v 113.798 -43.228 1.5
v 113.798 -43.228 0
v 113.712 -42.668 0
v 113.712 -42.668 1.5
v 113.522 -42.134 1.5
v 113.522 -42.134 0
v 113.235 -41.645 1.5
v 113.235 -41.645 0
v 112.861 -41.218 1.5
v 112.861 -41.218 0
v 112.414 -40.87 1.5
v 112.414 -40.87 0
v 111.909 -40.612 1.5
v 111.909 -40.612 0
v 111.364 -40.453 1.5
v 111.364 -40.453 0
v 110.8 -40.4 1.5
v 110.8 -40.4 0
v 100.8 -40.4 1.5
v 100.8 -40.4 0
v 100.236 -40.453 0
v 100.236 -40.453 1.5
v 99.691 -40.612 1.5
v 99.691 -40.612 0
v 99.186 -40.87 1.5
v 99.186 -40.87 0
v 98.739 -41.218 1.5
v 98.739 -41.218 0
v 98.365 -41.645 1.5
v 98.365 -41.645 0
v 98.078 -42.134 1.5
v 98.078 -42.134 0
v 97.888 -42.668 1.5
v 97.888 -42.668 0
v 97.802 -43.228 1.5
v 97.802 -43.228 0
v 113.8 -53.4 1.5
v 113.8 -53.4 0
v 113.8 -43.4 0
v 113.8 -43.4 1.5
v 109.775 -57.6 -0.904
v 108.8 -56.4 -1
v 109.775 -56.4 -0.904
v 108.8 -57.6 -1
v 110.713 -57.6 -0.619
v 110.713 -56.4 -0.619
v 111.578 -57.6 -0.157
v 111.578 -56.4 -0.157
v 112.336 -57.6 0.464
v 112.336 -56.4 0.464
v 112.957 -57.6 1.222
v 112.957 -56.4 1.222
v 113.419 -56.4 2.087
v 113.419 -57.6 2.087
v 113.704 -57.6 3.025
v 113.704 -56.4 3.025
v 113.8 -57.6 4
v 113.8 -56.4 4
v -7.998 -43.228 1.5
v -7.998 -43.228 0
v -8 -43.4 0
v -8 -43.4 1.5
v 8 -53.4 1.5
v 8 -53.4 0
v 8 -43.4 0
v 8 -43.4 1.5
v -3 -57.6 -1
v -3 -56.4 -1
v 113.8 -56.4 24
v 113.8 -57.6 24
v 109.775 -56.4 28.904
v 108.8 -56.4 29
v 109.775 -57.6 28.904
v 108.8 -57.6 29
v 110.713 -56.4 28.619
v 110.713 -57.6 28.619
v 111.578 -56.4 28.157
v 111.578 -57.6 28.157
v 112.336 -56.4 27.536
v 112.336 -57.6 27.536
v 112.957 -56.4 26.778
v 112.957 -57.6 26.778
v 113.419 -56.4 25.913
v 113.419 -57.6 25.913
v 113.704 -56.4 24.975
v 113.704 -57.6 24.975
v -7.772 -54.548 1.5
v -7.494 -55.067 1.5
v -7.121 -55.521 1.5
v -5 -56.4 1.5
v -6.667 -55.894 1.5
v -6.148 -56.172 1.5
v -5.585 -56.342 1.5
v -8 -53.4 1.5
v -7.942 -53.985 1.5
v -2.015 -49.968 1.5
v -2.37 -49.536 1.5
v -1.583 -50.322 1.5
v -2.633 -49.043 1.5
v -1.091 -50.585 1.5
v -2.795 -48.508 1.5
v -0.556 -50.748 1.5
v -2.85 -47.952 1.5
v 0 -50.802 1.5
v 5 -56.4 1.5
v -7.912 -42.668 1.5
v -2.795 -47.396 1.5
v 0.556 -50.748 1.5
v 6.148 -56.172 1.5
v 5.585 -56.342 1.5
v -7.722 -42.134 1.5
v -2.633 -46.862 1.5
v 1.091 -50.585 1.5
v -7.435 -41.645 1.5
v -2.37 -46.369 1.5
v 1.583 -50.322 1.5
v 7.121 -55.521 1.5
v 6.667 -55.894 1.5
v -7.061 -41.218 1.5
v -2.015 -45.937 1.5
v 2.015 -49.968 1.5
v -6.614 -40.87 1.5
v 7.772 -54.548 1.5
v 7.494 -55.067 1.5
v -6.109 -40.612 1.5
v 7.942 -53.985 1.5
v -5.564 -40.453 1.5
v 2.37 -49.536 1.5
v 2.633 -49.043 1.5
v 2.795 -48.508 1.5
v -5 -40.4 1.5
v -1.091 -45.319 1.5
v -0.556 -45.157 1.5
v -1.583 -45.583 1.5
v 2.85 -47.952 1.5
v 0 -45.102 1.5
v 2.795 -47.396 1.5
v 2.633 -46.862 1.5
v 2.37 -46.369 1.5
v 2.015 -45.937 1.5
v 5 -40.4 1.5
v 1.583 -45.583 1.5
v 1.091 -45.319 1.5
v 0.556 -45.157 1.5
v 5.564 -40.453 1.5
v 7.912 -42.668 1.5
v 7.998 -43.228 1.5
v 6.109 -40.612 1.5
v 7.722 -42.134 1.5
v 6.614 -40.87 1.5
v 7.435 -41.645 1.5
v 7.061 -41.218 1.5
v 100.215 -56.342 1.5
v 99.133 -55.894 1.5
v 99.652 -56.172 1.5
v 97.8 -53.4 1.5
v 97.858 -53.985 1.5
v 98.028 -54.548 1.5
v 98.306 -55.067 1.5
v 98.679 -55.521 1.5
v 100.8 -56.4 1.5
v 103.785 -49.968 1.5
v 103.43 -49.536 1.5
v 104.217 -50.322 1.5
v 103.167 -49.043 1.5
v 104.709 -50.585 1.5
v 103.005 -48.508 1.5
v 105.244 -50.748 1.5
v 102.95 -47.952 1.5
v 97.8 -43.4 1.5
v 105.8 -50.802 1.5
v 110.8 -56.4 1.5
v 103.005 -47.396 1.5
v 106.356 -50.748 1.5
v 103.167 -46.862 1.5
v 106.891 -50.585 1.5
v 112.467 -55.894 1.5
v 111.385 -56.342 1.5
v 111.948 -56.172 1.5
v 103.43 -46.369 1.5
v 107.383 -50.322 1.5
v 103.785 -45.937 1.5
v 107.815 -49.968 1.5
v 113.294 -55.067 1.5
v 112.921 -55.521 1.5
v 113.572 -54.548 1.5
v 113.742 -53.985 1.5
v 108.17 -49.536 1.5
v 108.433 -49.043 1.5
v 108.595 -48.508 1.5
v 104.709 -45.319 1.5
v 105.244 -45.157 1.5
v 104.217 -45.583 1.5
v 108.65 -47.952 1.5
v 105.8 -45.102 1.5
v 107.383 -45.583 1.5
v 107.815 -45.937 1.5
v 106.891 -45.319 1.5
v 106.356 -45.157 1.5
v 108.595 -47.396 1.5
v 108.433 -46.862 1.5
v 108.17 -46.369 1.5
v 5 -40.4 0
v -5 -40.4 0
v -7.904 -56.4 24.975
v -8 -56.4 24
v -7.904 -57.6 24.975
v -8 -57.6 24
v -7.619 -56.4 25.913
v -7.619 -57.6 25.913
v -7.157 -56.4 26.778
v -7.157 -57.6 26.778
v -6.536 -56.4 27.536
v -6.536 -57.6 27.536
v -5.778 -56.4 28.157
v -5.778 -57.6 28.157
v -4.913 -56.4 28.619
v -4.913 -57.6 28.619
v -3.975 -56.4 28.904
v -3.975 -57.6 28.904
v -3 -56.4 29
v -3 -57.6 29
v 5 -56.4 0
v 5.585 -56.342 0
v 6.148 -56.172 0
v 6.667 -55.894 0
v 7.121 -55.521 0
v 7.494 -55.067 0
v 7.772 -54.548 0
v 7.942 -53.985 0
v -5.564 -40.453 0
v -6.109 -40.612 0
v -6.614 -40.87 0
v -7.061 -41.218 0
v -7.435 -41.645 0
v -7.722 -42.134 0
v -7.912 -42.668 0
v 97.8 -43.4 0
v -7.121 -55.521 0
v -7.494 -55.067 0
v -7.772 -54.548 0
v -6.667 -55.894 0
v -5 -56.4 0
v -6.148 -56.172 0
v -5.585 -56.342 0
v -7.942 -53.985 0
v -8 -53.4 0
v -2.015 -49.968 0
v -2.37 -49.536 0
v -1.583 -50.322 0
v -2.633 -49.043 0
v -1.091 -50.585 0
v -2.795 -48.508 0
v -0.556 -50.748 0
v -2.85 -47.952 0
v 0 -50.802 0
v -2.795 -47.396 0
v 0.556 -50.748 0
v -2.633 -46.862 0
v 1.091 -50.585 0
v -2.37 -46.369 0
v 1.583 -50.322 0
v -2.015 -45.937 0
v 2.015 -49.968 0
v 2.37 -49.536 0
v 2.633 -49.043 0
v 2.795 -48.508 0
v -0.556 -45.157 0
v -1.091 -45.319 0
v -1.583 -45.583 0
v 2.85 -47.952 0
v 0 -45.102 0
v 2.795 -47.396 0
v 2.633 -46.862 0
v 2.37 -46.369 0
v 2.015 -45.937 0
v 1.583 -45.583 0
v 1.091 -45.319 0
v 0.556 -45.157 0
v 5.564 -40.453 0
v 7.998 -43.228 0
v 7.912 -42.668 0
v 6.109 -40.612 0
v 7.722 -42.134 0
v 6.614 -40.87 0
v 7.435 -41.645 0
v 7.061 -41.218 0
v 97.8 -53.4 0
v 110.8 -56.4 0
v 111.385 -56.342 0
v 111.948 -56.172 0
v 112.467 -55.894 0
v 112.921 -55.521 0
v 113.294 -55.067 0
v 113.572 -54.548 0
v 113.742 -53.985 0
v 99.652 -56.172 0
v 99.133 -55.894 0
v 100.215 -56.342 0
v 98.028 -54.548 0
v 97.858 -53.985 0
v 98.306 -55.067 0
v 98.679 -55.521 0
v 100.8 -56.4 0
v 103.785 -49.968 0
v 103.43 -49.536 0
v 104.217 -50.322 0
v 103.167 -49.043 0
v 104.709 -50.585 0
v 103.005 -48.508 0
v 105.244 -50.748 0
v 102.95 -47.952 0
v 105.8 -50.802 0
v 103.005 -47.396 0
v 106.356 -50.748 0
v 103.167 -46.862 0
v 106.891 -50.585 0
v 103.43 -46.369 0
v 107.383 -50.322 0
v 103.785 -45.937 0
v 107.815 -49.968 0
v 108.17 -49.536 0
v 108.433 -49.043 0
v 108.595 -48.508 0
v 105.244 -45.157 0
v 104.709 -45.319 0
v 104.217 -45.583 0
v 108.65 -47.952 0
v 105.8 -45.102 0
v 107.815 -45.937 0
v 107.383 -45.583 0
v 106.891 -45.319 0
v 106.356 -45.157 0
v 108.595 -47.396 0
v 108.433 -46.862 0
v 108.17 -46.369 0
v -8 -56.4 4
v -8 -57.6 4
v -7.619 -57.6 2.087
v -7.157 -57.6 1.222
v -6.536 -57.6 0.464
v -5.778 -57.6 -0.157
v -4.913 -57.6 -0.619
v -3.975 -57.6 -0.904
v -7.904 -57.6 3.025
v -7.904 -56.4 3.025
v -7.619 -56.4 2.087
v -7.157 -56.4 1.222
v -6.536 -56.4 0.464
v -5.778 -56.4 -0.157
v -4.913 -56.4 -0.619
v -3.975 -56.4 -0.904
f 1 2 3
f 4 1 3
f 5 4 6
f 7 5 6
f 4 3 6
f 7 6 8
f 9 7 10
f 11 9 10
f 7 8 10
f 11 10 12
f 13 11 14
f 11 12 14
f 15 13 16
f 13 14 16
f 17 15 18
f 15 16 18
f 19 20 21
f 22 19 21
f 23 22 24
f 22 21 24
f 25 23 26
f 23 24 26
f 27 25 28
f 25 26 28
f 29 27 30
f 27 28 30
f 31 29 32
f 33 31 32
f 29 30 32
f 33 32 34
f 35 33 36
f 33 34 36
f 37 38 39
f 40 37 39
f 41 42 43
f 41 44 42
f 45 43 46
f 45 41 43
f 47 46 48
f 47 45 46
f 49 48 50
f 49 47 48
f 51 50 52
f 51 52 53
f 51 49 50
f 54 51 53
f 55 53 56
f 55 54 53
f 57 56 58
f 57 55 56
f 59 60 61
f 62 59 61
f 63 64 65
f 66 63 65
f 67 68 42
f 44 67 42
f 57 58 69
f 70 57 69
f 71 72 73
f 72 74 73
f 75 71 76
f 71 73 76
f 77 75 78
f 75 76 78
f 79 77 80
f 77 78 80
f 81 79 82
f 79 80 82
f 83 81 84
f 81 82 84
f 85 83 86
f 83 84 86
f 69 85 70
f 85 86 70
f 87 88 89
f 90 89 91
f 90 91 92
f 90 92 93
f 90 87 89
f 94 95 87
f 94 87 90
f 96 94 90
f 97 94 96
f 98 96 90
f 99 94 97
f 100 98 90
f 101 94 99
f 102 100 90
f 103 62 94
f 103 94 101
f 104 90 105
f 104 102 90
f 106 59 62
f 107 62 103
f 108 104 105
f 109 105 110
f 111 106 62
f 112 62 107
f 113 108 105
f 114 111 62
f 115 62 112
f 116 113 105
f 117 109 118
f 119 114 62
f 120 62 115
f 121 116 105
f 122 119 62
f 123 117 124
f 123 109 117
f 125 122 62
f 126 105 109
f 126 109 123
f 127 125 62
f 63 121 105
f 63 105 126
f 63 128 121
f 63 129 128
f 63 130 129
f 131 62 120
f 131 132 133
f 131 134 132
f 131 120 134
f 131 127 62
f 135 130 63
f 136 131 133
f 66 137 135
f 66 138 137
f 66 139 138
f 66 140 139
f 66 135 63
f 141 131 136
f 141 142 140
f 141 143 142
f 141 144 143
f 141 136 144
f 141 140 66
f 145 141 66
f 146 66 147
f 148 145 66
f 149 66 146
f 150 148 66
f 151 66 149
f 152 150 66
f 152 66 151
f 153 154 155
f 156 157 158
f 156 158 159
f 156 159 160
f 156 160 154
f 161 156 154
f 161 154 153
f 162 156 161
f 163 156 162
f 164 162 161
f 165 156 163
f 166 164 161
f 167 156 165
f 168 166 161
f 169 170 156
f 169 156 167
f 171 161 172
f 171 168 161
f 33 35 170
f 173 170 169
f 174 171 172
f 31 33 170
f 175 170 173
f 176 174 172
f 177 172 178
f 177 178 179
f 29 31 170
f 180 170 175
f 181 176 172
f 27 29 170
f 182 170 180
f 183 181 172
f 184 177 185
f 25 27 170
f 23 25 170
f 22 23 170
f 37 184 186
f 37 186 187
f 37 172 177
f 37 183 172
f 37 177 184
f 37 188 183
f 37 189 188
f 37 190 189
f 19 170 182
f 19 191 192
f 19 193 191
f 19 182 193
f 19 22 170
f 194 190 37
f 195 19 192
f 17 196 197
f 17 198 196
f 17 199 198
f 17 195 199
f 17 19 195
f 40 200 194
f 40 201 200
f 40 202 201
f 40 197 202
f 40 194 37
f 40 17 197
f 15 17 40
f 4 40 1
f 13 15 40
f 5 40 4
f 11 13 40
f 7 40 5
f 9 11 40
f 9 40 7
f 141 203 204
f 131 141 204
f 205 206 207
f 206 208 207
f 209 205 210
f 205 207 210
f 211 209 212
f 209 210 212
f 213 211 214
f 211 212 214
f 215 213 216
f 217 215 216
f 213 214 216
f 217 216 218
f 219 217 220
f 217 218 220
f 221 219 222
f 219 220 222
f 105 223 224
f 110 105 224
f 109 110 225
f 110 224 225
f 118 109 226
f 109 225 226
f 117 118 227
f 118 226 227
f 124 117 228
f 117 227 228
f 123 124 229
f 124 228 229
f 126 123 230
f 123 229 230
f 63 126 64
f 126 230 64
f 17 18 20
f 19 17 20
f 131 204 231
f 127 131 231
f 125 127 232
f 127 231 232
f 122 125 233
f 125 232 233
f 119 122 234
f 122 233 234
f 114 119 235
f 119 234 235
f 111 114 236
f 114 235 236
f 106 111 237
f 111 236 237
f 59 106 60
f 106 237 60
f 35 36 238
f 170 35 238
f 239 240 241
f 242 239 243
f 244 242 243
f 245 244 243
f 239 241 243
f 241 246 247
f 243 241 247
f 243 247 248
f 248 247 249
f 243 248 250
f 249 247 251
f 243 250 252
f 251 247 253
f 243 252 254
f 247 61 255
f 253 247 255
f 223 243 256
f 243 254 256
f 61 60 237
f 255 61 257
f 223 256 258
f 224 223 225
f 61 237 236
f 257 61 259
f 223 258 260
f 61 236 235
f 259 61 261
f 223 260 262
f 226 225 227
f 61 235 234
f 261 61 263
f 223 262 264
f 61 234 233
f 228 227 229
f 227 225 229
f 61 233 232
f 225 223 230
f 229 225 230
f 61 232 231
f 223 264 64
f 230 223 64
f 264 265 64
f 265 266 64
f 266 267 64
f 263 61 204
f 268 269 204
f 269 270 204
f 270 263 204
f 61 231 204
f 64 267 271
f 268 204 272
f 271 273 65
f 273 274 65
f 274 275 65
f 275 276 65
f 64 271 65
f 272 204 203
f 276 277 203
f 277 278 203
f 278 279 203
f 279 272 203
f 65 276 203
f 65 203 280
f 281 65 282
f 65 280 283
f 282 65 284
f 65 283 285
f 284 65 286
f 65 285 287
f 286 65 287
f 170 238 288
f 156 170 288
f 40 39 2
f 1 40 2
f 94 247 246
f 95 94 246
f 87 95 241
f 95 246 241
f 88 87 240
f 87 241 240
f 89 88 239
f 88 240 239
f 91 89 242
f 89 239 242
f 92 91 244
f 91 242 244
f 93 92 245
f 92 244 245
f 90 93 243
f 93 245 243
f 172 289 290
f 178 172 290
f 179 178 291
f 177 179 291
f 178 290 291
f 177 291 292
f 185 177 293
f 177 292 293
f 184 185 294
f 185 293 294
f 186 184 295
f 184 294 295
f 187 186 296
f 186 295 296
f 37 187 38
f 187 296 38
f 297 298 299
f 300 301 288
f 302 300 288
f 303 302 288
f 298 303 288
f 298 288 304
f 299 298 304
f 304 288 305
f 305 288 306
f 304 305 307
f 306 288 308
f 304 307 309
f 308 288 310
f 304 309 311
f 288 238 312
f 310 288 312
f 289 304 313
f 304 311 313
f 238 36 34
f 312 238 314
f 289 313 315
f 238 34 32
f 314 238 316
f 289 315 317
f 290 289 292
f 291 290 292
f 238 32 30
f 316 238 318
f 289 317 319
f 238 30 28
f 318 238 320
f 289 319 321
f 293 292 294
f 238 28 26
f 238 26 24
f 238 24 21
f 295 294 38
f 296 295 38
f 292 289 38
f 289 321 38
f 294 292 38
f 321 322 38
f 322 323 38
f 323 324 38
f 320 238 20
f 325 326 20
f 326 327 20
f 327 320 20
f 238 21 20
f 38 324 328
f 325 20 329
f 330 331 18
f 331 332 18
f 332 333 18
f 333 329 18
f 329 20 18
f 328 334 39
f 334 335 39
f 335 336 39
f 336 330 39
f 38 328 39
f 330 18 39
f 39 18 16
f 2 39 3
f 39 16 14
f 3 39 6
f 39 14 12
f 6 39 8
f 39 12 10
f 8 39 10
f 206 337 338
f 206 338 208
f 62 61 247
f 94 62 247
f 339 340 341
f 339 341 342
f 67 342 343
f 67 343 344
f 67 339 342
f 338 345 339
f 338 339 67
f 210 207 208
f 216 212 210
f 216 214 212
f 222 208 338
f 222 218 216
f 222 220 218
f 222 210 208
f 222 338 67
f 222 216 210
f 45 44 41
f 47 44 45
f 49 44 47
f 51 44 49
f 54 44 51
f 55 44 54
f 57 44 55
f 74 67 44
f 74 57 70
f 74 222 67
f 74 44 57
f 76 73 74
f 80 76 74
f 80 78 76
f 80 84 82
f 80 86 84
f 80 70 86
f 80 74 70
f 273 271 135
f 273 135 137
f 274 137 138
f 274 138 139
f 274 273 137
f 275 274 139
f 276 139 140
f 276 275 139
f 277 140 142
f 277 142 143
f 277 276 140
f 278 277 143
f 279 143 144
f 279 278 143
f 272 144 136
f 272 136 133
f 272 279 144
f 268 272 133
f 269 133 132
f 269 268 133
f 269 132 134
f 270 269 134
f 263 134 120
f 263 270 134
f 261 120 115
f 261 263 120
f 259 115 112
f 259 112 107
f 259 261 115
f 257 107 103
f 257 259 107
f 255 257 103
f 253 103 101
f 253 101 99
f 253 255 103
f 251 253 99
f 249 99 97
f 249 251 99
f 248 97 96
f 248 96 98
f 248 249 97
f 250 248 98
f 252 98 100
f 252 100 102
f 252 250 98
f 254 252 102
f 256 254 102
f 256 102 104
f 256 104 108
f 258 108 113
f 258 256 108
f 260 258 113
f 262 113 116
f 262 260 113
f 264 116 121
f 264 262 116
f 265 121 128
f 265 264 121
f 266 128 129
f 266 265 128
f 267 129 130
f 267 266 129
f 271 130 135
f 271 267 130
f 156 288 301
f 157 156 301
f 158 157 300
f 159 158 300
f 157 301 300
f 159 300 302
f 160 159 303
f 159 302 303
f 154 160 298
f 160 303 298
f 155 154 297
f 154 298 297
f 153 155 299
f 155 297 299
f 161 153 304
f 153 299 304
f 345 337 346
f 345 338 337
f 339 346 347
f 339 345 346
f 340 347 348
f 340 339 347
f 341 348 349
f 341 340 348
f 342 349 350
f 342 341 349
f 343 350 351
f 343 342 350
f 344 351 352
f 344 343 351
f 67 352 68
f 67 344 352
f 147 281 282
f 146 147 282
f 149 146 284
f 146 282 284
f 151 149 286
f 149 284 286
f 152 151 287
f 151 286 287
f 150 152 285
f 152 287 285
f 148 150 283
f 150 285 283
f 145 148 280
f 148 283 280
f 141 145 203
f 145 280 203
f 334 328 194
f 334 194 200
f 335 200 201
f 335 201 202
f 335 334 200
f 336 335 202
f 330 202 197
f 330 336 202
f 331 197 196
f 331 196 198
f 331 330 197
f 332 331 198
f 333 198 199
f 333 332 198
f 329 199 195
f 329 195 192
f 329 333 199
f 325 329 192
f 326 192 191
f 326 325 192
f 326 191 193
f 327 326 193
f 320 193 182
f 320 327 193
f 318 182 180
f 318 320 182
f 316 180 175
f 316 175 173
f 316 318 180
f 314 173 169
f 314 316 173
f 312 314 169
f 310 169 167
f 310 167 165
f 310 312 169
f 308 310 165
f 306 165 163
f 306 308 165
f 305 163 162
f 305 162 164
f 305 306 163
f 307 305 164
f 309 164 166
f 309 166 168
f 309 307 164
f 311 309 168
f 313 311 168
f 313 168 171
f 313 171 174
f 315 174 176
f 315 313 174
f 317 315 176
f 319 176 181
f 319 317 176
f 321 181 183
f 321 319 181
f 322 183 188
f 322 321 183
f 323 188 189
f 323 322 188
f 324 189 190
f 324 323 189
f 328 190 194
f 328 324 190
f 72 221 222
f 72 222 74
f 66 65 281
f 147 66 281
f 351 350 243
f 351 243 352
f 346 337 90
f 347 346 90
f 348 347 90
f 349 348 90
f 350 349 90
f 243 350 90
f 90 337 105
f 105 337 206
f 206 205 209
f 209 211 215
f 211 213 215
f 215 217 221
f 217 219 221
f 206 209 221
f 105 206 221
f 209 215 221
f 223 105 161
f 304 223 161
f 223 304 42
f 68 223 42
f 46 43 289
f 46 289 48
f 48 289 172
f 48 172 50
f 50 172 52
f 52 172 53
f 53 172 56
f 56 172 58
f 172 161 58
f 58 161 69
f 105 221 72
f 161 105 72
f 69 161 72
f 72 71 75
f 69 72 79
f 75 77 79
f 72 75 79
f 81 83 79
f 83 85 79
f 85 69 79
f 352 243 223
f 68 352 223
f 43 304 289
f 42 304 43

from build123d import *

# Parameters (mm, degrees)
SKETCH3_R             = 2.85
BOSS_EXTRUDE3_DEPTH   = 1.5
BOSS_EXTRUDE3_2_DEPTH = 1.5
SKETCH2_W             = 121.8
SKETCH2_H             = 30
BOSS_EXTRUDE2_DEPTH   = 1.2
FILLET1_R             = 5


with BuildPart() as part:
    # Sketch3 → Boss-Extrude3 (new body)
    with BuildSketch(Plane.XY):
        with BuildLine():
            Line((-7.997540574, -43.228135601), (-8, -43.4))
            Line((-8, -43.4), (-8, -53.4))
            ThreePointArc((-8, -53.4), (-7.121320344, -55.521320344), (-5, -56.4))
            Line((-5, -56.4), (5, -56.4))
            ThreePointArc((5, -56.4), (7.121320344, -55.521320344), (8, -53.4))
            Line((8, -53.4), (8, -43.4))
            Line((8, -43.4), (7.997540574, -43.228135601))
            ThreePointArc((7.997540574, -43.228135601), (7.060914023, -41.218251724), (5, -40.4))
            Line((5, -40.4), (-5, -40.4))
            ThreePointArc((-5, -40.4), (-7.060914023, -41.218251724), (-7.997540574, -43.228135601))
        make_face()
        with Locations((0, -47.952381154)):
            Circle(SKETCH3_R, mode=Mode.SUBTRACT)
    extrude(amount=BOSS_EXTRUDE3_DEPTH)



with BuildPart() as body_2:
    # Sketch3 → Boss-Extrude3 2 (new body)
    with BuildSketch(Plane.XY):
        with BuildLine():
            Line((110.8, -40.4), (100.8, -40.4))
            ThreePointArc((100.8, -40.4), (98.739085977, -41.218251724), (97.802459426, -43.228135601))
            Line((97.802459426, -43.228135601), (97.8, -43.4))
            Line((97.8, -43.4), (97.8, -53.4))
            ThreePointArc((97.8, -53.4), (98.678679656, -55.521320344), (100.8, -56.4))
            Line((100.8, -56.4), (110.8, -56.4))
            ThreePointArc((110.8, -56.4), (112.921320344, -55.521320344), (113.8, -53.4))
            Line((113.8, -53.4), (113.8, -43.4))
            Line((113.8, -43.4), (113.797540574, -43.228135601))
            ThreePointArc((113.797540574, -43.228135601), (112.860914023, -41.218251724), (110.8, -40.4))
        make_face()
        with Locations((105.8, -47.952381154)):
            Circle(SKETCH3_R, mode=Mode.SUBTRACT)
    extrude(amount=BOSS_EXTRUDE3_2_DEPTH)


with BuildPart() as part_1:
    add(part.part)

    add(body_2.part)  # Boss-Extrude2 merges body 2
    # Sketch2 → Boss-Extrude2 (add)
    with BuildSketch(Plane.XZ.offset(56.4)):
        with Locations((52.9, 14)):
            Rectangle(SKETCH2_W, SKETCH2_H)
    extrude(amount=BOSS_EXTRUDE2_DEPTH)

    # Fillet1
    fillet1_edges = [part_1.edges().sort_by_distance(p)[0] for p in [
        (-8, -57, 29),
        (-8, -57, -1),
        (113.8, -57, -1),
        (113.8, -57, 29),
    ]]
    fillet(fillet1_edges, radius=FILLET1_R)


solid = part_1.part
